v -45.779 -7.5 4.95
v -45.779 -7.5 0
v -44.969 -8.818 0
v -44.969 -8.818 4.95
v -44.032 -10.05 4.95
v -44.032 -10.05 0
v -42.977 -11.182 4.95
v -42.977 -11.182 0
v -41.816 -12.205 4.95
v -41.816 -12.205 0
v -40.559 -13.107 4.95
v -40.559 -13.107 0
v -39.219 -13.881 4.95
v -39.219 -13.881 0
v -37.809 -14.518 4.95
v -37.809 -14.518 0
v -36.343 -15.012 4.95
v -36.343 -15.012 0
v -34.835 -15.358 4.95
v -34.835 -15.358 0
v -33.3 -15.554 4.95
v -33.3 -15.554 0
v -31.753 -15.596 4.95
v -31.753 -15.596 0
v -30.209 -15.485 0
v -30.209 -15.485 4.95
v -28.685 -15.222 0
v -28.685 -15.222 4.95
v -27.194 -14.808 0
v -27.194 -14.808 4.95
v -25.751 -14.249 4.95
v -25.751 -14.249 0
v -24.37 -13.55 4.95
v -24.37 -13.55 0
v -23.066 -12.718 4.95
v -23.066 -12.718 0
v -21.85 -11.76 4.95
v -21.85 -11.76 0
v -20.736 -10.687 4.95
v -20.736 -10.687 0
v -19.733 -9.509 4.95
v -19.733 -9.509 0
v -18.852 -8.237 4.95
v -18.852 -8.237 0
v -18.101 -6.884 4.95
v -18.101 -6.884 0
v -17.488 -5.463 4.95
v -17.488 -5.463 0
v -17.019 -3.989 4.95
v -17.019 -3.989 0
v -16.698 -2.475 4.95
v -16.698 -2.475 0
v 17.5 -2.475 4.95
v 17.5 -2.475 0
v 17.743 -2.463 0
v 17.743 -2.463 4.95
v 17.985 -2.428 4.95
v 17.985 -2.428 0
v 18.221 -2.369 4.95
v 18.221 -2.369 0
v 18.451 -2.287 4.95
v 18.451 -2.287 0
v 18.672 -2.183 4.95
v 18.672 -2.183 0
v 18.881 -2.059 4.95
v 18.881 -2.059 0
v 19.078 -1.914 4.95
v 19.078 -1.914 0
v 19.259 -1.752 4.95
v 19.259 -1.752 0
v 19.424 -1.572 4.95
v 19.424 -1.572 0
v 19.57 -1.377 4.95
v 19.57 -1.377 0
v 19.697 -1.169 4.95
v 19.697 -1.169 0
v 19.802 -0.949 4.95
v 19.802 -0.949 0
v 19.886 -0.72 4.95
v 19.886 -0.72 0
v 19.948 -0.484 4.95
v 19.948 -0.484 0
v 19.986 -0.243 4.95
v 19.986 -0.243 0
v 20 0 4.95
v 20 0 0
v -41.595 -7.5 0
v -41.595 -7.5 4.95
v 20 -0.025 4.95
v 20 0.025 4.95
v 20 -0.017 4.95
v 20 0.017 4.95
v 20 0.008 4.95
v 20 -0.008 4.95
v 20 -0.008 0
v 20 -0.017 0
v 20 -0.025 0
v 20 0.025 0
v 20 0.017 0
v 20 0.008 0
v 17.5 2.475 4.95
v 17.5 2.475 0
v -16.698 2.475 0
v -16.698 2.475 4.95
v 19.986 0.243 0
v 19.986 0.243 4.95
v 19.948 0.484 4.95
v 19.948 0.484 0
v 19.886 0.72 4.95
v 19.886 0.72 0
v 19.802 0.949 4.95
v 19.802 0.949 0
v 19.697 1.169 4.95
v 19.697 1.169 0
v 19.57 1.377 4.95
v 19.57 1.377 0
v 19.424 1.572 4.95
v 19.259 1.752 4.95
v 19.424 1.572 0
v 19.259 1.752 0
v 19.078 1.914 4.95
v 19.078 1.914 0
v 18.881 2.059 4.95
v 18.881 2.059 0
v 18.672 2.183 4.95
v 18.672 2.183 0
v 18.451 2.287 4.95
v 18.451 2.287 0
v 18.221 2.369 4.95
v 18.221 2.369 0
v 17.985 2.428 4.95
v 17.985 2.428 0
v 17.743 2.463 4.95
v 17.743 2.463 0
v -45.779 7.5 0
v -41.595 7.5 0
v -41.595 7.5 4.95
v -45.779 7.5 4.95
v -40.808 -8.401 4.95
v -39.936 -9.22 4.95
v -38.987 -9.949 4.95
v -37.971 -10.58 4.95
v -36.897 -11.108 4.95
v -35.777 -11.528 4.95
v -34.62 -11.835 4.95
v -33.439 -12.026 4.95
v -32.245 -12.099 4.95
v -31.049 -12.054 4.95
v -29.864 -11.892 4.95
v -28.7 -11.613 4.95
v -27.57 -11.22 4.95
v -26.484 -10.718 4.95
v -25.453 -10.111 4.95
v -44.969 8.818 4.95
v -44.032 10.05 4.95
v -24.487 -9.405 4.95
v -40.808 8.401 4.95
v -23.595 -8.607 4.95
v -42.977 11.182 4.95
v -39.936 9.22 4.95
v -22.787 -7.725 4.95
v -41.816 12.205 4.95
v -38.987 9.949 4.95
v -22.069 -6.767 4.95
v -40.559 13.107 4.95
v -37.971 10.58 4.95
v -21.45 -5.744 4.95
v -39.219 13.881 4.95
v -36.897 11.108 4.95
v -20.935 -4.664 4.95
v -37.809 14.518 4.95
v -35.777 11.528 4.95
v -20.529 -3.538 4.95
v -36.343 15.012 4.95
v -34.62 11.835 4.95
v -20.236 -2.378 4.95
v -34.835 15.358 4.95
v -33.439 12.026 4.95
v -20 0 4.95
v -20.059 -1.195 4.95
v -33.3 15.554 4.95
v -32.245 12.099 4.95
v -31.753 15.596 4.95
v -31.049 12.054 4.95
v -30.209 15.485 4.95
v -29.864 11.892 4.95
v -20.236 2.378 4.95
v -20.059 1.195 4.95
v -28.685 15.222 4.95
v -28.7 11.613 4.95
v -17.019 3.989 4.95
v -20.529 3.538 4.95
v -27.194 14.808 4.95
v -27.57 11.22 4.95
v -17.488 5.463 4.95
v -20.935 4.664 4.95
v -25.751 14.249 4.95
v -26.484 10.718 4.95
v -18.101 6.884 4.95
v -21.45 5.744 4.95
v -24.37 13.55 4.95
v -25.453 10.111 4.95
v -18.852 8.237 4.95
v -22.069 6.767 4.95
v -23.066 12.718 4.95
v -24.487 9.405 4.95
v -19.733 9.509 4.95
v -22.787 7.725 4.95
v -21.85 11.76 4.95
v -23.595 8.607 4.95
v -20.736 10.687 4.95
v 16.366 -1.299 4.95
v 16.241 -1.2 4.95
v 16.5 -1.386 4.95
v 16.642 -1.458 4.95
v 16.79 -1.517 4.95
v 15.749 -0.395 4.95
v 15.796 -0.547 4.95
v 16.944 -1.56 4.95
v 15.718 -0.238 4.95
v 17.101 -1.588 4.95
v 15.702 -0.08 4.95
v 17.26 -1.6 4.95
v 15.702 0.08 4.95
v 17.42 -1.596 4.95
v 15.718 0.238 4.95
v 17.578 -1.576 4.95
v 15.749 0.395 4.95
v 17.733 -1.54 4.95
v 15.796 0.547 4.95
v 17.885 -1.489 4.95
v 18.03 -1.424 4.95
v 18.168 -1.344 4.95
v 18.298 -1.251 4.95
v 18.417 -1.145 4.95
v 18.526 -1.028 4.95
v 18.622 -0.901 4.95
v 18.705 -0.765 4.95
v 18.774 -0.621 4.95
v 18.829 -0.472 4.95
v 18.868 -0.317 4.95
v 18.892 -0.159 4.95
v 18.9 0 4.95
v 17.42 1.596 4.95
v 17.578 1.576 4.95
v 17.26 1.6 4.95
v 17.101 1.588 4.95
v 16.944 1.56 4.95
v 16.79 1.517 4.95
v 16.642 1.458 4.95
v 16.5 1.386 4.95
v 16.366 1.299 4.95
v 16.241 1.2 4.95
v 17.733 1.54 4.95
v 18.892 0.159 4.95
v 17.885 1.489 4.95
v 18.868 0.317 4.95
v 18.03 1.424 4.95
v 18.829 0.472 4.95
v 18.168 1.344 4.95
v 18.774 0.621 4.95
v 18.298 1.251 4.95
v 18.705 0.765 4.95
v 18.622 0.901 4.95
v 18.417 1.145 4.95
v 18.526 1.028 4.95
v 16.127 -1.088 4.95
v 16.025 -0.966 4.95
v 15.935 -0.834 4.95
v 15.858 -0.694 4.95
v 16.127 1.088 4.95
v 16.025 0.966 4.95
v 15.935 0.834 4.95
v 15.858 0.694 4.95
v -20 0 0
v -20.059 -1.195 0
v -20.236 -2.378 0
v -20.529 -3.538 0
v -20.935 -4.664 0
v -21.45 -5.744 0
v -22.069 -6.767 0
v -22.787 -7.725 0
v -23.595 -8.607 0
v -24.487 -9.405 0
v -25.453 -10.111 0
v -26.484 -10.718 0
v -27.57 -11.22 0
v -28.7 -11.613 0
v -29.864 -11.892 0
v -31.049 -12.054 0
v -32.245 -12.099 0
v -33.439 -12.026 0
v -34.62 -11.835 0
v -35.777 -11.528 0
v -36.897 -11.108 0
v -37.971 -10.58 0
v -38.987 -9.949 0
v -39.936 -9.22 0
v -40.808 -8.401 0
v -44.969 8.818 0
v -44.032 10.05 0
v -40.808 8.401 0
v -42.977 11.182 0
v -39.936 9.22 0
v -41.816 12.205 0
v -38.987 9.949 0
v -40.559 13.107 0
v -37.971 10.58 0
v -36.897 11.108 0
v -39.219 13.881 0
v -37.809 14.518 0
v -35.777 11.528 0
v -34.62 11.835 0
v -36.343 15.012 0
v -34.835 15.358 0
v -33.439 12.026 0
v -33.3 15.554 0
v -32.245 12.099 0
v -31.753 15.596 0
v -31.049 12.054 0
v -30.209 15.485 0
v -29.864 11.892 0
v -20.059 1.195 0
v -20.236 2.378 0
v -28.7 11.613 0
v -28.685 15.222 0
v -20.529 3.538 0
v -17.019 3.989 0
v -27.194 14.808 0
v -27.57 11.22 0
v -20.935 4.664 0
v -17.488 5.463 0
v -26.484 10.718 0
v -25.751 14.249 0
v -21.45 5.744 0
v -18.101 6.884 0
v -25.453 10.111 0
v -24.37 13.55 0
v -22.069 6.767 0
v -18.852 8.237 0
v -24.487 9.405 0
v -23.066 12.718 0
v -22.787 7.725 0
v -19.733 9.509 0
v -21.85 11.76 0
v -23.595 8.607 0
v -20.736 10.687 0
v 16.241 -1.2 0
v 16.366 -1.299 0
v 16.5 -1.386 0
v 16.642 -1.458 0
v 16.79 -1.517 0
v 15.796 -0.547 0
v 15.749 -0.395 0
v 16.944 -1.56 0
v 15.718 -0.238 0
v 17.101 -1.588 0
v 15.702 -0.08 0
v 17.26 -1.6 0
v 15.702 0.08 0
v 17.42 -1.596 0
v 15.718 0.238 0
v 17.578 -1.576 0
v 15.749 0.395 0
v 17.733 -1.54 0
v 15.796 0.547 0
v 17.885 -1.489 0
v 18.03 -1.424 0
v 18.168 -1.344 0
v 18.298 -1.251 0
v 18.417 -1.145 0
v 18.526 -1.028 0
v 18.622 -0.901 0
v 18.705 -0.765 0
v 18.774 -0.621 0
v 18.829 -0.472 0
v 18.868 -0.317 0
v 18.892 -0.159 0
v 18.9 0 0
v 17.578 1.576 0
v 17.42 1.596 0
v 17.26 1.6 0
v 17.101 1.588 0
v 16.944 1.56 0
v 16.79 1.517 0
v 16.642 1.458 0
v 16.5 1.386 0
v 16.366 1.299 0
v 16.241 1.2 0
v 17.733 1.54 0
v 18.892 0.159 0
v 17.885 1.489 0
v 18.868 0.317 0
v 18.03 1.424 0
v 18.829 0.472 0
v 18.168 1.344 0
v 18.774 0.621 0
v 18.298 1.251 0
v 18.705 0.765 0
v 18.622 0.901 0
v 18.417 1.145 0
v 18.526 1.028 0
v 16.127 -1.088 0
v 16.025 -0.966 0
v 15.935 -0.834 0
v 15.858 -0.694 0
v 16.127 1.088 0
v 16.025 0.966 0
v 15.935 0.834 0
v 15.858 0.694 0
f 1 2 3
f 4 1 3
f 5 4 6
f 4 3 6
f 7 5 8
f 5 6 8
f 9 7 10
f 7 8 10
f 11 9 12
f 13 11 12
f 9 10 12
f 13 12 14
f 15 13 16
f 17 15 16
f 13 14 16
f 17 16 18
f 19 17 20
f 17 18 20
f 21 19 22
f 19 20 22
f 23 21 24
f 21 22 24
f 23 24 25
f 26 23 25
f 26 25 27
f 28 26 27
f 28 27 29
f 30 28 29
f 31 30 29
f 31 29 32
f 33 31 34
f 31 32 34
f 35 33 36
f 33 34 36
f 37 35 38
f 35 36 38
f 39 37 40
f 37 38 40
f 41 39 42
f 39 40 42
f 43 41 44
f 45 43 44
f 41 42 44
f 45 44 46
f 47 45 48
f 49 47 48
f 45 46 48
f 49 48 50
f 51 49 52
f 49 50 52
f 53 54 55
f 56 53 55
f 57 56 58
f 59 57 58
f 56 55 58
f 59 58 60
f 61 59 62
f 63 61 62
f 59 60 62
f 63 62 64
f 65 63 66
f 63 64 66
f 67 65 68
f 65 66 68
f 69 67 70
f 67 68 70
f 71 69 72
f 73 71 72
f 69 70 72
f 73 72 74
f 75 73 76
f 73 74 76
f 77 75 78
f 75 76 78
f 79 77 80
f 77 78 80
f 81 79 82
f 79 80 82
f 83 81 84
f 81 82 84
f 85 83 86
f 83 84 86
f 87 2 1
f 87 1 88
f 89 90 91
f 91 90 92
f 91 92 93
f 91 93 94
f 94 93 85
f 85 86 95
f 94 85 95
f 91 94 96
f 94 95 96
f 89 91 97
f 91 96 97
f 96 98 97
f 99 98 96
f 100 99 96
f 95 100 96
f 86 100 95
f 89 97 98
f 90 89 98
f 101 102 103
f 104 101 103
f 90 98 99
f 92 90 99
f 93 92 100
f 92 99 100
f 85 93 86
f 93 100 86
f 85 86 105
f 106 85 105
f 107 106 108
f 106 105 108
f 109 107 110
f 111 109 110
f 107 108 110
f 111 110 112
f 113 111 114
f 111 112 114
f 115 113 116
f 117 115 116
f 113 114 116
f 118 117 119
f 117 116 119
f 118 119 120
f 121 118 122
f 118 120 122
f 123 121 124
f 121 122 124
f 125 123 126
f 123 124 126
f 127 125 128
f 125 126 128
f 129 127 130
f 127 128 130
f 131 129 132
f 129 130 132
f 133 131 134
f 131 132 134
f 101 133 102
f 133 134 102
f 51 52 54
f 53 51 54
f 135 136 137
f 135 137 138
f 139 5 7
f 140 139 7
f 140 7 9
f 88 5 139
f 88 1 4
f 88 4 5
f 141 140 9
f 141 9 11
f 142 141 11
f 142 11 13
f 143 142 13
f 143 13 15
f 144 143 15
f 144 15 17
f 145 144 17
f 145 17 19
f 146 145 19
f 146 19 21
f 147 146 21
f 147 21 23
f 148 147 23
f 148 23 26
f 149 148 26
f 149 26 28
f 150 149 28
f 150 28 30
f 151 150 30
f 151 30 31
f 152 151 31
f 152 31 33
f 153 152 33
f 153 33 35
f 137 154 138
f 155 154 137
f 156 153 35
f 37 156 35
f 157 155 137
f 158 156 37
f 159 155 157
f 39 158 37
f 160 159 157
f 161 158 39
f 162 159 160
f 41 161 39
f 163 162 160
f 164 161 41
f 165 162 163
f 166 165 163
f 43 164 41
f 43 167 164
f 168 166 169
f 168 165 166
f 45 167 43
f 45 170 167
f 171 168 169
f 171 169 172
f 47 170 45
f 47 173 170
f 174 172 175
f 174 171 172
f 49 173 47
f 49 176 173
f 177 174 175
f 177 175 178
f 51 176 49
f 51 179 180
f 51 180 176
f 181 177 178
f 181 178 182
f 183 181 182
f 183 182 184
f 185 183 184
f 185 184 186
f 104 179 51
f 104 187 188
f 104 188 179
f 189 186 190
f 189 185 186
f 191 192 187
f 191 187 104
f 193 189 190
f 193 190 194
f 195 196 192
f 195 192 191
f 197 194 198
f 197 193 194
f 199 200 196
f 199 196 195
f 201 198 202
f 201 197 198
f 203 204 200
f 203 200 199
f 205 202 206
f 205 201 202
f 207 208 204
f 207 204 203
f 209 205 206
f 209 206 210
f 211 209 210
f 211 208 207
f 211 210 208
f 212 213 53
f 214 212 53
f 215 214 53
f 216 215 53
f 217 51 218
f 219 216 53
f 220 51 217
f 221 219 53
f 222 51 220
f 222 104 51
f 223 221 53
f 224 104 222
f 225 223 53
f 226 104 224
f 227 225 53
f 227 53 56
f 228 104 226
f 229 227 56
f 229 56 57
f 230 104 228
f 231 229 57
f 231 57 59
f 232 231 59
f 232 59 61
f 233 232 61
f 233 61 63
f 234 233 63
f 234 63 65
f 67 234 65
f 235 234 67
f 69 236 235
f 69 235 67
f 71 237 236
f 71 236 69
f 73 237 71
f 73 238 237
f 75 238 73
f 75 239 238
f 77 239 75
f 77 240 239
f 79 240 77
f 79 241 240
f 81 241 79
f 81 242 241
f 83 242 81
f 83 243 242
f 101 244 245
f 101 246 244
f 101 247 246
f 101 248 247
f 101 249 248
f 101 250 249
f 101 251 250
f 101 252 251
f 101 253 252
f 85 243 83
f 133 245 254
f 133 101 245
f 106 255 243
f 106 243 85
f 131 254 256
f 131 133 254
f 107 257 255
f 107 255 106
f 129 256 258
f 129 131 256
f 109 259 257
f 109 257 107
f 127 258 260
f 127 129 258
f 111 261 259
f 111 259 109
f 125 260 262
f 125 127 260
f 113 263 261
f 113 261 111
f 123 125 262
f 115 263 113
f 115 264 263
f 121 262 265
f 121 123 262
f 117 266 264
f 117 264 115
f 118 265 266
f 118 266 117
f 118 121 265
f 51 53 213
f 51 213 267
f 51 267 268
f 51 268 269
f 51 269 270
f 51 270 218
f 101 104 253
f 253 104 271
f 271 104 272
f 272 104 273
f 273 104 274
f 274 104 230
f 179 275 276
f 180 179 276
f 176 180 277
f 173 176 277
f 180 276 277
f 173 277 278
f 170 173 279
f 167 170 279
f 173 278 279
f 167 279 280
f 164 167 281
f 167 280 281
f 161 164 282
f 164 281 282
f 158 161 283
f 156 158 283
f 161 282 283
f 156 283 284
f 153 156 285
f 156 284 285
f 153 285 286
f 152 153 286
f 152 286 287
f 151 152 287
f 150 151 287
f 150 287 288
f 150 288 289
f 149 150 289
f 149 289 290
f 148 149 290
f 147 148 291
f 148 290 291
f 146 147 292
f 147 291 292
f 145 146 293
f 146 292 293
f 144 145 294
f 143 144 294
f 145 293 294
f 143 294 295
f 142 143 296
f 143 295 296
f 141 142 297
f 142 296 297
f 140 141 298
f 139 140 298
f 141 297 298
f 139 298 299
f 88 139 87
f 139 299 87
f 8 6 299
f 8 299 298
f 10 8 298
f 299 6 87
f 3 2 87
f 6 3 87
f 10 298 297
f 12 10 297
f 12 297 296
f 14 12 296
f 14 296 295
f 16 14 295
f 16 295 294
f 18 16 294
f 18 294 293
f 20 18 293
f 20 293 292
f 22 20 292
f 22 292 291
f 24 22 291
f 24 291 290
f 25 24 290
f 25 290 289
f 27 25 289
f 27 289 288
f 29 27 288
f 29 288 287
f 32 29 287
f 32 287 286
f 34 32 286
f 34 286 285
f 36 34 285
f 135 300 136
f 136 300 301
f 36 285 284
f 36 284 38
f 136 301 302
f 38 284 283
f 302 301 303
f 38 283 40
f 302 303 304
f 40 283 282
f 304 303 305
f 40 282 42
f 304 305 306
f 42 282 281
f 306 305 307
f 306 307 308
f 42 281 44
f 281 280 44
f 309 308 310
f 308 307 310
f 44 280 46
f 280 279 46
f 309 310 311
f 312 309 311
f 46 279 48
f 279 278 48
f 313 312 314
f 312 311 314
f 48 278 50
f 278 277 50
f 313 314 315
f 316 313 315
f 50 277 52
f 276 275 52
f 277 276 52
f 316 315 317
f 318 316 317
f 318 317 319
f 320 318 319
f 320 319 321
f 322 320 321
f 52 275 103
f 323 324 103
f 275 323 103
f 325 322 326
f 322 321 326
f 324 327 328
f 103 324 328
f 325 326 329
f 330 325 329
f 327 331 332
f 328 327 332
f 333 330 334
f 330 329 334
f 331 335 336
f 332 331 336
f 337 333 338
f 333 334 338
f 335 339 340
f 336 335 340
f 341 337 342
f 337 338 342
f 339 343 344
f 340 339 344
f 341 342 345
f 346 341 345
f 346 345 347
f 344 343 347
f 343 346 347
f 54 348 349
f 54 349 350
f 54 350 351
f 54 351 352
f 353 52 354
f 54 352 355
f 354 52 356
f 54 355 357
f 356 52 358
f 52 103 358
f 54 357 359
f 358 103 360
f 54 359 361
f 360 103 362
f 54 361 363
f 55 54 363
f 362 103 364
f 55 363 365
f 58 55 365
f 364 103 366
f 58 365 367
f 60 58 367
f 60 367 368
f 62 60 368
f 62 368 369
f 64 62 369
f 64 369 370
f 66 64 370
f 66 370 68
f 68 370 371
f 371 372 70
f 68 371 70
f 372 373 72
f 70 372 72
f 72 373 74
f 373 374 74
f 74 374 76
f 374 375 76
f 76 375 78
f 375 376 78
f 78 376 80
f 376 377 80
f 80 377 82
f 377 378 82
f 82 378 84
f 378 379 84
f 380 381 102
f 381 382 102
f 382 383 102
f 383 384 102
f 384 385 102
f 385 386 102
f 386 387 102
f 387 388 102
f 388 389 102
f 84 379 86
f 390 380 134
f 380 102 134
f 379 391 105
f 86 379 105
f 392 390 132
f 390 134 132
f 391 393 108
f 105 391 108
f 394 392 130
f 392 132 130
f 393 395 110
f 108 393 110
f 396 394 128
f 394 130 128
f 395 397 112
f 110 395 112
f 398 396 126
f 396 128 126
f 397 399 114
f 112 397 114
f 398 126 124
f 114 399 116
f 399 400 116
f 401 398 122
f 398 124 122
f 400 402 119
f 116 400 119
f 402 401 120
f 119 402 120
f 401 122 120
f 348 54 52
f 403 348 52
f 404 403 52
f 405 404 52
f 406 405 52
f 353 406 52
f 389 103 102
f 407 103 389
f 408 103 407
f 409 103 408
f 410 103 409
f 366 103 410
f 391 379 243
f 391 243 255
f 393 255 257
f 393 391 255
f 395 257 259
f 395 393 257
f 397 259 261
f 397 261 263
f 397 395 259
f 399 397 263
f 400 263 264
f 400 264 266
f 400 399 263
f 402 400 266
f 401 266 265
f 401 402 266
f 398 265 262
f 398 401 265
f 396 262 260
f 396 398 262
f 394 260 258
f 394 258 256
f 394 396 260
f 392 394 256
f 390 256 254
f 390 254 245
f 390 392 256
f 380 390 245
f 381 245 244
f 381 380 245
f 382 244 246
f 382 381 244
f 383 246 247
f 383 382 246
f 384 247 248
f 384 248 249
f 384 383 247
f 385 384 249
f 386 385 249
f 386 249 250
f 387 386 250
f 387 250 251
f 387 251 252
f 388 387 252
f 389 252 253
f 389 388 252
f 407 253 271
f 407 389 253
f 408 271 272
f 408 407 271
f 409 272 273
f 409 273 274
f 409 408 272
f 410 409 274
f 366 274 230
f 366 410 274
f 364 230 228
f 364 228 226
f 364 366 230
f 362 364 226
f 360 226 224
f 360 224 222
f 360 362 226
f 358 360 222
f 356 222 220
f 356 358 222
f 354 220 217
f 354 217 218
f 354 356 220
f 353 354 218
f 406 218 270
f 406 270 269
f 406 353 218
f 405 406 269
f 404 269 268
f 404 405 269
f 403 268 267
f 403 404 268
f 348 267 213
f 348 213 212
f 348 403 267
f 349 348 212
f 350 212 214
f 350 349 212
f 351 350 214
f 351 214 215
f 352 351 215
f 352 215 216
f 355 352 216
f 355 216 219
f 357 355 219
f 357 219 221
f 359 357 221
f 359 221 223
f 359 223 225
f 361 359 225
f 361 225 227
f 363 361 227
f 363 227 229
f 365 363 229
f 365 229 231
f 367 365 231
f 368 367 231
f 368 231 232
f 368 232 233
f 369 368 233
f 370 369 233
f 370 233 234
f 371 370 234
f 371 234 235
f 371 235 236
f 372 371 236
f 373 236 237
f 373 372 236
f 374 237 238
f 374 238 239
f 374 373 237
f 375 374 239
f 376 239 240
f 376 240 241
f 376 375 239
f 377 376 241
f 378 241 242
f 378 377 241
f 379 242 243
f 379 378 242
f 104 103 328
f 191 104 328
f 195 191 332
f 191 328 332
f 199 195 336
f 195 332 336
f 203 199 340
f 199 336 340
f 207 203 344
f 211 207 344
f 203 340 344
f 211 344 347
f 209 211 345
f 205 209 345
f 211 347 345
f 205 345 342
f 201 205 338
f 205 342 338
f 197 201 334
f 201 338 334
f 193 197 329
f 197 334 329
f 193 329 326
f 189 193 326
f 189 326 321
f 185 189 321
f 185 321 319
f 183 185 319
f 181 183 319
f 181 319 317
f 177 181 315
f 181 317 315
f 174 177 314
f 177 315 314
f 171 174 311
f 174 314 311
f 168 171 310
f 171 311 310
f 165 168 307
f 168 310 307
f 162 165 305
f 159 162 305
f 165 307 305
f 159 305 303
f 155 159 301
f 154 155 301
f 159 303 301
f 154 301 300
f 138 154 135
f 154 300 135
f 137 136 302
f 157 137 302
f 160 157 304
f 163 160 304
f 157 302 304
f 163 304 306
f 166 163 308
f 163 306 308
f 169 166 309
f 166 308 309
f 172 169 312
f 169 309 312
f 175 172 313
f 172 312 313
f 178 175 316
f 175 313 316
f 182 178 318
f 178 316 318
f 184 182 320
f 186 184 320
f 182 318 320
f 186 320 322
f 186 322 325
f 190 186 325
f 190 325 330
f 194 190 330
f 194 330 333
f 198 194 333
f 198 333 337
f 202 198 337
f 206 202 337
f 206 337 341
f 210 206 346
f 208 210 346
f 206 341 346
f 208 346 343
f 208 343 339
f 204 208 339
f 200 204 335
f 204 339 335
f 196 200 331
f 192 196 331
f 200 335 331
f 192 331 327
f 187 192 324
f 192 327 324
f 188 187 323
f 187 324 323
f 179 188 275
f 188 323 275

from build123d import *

# Parameters (mm, degrees)
F1_DEPTH = 4.95
F0_R     = 1.6
F2_DEPTH = 22


with BuildPart() as f1:
    # F0 (on Top) → F1 (new body)
    with BuildSketch(Plane.XY):
        with BuildLine():
            ThreePointArc((20, 0.025), (19.999968749, 0.0124998437), (19.9998749969, 0))
            ThreePointArc((19.9998749969, 0), (19.999968749, -0.0124998437), (20, -0.025))
            Line((20, -0.025), (20, 0.025))
        make_face()
    extrude(amount=F1_DEPTH)


with BuildPart() as f1b:
    # F0 (on Top) → F1, piece 2 (new body)
    with BuildSketch(Plane.XY):
        with BuildLine():
            Line((-16.6975854166, -2.475), (17.5, -2.475))
            ThreePointArc((17.5, -2.475), (19.2589059099, -1.7515838004), (19.9998749969, 0))
            ThreePointArc((19.9998749969, 0), (19.2589059099, 1.7515838004), (17.5, 2.475))
            Line((17.5, 2.475), (-16.6975854166, 2.475))
            ThreePointArc((-16.6975854166, 2.475), (-16.5494748079, 1.2414371709), (-16.5, 0))
            ThreePointArc((-16.5, 0), (-16.5494748079, -1.2414371709), (-16.6975854166, -2.475))
        make_face()
        with Locations((17.3, 0)):
            Circle(F0_R, mode=Mode.SUBTRACT)
        with BuildLine():
            ThreePointArc((-45.7788157382, -7.5), (-29.4438082722, -15.3722036646), (-16.6975854166, -2.475))
            Line((-16.6975854166, -2.475), (-20, -2.475))
            Line((-20, -2.475), (-20, 0))
            ThreePointArc((-20, 0), (-28.1302814907, -11.4302814907), (-41.5952619764, -7.5))
            Line((-41.5952619764, -7.5), (-45.7788157382, -7.5))
        make_face()
        with BuildLine():
            Line((-20, -2.475), (-16.6975854166, -2.475))
            ThreePointArc((-16.6975854166, -2.475), (-16.5494748079, -1.2414371709), (-16.5, 0))
            ThreePointArc((-16.5, 0), (-16.5494748079, 1.2414371709), (-16.6975854166, 2.475))
            Line((-16.6975854166, 2.475), (-20, 2.475))
            Line((-20, 2.475), (-20, 0))
            Line((-20, 0), (-20, -2.475))
        make_face()
        with BuildLine():
            Line((-53.3, -7.5), (-45.7788157382, -7.5))
            ThreePointArc((-45.7788157382, -7.5), (-47.7, 0), (-45.7788157382, 7.5))
            Line((-45.7788157382, 7.5), (-53.3, 7.5))
            Line((-53.3, 7.5), (-53.3, -7.5))
        make_face()
        with BuildLine():
            ThreePointArc((-45.7788157382, 7.5), (-47.7, 0), (-45.7788157382, -7.5))
            Line((-45.7788157382, -7.5), (-41.5952619764, -7.5))
            ThreePointArc((-41.5952619764, -7.5), (-44.2, 0), (-41.5952619764, 7.5))
            Line((-41.5952619764, 7.5), (-45.7788157382, 7.5))
        make_face()
        with BuildLine():
            ThreePointArc((-41.5952619764, 7.5), (-28.1302814907, 11.4302814907), (-20, 0))
            Line((-20, 0), (-20, 2.475))
            Line((-20, 2.475), (-16.6975854166, 2.475))
            ThreePointArc((-16.6975854166, 2.475), (-29.4438082722, 15.3722036646), (-45.7788157382, 7.5))
            Line((-45.7788157382, 7.5), (-41.5952619764, 7.5))
        make_face()
    extrude(amount=F1_DEPTH)

    # F0 (on Top) → F2 (cut)
    with BuildSketch(Plane.XY):
        with BuildLine():
            Line((-53.3, -7.5), (-45.7788157382, -7.5))
            ThreePointArc((-45.7788157382, -7.5), (-47.7, 0), (-45.7788157382, 7.5))
            Line((-45.7788157382, 7.5), (-53.3, 7.5))
            Line((-53.3, 7.5), (-53.3, -7.5))
        make_face()
        with BuildLine():
            ThreePointArc((-45.7788157382, 7.5), (-47.7, 0), (-45.7788157382, -7.5))
            Line((-45.7788157382, -7.5), (-41.5952619764, -7.5))
            ThreePointArc((-41.5952619764, -7.5), (-44.2, 0), (-41.5952619764, 7.5))
            Line((-41.5952619764, 7.5), (-45.7788157382, 7.5))
        make_face()
        with BuildLine():
            ThreePointArc((-41.5952619764, 7.5), (-44.2, 0), (-41.5952619764, -7.5))
            Line((-41.5952619764, -7.5), (-35.1, -7.5))
            Line((-35.1, -7.5), (-35.1, 7.5))
            Line((-35.1, 7.5), (-41.5952619764, 7.5))
        make_face()
        with BuildLine():
            ThreePointArc((-41.5952619764, -7.5), (-28.1302814907, -11.4302814907), (-20, 0))
            ThreePointArc((-20, 0), (-28.1302814907, 11.4302814907), (-41.5952619764, 7.5))
            Line((-41.5952619764, 7.5), (-35.1, 7.5))
            Line((-35.1, 7.5), (-35.1, -7.5))
            Line((-35.1, -7.5), (-41.5952619764, -7.5))
        make_face()
    extrude(amount=F2_DEPTH, mode=Mode.SUBTRACT)


solid = Compound([f1.part, f1b.part])
